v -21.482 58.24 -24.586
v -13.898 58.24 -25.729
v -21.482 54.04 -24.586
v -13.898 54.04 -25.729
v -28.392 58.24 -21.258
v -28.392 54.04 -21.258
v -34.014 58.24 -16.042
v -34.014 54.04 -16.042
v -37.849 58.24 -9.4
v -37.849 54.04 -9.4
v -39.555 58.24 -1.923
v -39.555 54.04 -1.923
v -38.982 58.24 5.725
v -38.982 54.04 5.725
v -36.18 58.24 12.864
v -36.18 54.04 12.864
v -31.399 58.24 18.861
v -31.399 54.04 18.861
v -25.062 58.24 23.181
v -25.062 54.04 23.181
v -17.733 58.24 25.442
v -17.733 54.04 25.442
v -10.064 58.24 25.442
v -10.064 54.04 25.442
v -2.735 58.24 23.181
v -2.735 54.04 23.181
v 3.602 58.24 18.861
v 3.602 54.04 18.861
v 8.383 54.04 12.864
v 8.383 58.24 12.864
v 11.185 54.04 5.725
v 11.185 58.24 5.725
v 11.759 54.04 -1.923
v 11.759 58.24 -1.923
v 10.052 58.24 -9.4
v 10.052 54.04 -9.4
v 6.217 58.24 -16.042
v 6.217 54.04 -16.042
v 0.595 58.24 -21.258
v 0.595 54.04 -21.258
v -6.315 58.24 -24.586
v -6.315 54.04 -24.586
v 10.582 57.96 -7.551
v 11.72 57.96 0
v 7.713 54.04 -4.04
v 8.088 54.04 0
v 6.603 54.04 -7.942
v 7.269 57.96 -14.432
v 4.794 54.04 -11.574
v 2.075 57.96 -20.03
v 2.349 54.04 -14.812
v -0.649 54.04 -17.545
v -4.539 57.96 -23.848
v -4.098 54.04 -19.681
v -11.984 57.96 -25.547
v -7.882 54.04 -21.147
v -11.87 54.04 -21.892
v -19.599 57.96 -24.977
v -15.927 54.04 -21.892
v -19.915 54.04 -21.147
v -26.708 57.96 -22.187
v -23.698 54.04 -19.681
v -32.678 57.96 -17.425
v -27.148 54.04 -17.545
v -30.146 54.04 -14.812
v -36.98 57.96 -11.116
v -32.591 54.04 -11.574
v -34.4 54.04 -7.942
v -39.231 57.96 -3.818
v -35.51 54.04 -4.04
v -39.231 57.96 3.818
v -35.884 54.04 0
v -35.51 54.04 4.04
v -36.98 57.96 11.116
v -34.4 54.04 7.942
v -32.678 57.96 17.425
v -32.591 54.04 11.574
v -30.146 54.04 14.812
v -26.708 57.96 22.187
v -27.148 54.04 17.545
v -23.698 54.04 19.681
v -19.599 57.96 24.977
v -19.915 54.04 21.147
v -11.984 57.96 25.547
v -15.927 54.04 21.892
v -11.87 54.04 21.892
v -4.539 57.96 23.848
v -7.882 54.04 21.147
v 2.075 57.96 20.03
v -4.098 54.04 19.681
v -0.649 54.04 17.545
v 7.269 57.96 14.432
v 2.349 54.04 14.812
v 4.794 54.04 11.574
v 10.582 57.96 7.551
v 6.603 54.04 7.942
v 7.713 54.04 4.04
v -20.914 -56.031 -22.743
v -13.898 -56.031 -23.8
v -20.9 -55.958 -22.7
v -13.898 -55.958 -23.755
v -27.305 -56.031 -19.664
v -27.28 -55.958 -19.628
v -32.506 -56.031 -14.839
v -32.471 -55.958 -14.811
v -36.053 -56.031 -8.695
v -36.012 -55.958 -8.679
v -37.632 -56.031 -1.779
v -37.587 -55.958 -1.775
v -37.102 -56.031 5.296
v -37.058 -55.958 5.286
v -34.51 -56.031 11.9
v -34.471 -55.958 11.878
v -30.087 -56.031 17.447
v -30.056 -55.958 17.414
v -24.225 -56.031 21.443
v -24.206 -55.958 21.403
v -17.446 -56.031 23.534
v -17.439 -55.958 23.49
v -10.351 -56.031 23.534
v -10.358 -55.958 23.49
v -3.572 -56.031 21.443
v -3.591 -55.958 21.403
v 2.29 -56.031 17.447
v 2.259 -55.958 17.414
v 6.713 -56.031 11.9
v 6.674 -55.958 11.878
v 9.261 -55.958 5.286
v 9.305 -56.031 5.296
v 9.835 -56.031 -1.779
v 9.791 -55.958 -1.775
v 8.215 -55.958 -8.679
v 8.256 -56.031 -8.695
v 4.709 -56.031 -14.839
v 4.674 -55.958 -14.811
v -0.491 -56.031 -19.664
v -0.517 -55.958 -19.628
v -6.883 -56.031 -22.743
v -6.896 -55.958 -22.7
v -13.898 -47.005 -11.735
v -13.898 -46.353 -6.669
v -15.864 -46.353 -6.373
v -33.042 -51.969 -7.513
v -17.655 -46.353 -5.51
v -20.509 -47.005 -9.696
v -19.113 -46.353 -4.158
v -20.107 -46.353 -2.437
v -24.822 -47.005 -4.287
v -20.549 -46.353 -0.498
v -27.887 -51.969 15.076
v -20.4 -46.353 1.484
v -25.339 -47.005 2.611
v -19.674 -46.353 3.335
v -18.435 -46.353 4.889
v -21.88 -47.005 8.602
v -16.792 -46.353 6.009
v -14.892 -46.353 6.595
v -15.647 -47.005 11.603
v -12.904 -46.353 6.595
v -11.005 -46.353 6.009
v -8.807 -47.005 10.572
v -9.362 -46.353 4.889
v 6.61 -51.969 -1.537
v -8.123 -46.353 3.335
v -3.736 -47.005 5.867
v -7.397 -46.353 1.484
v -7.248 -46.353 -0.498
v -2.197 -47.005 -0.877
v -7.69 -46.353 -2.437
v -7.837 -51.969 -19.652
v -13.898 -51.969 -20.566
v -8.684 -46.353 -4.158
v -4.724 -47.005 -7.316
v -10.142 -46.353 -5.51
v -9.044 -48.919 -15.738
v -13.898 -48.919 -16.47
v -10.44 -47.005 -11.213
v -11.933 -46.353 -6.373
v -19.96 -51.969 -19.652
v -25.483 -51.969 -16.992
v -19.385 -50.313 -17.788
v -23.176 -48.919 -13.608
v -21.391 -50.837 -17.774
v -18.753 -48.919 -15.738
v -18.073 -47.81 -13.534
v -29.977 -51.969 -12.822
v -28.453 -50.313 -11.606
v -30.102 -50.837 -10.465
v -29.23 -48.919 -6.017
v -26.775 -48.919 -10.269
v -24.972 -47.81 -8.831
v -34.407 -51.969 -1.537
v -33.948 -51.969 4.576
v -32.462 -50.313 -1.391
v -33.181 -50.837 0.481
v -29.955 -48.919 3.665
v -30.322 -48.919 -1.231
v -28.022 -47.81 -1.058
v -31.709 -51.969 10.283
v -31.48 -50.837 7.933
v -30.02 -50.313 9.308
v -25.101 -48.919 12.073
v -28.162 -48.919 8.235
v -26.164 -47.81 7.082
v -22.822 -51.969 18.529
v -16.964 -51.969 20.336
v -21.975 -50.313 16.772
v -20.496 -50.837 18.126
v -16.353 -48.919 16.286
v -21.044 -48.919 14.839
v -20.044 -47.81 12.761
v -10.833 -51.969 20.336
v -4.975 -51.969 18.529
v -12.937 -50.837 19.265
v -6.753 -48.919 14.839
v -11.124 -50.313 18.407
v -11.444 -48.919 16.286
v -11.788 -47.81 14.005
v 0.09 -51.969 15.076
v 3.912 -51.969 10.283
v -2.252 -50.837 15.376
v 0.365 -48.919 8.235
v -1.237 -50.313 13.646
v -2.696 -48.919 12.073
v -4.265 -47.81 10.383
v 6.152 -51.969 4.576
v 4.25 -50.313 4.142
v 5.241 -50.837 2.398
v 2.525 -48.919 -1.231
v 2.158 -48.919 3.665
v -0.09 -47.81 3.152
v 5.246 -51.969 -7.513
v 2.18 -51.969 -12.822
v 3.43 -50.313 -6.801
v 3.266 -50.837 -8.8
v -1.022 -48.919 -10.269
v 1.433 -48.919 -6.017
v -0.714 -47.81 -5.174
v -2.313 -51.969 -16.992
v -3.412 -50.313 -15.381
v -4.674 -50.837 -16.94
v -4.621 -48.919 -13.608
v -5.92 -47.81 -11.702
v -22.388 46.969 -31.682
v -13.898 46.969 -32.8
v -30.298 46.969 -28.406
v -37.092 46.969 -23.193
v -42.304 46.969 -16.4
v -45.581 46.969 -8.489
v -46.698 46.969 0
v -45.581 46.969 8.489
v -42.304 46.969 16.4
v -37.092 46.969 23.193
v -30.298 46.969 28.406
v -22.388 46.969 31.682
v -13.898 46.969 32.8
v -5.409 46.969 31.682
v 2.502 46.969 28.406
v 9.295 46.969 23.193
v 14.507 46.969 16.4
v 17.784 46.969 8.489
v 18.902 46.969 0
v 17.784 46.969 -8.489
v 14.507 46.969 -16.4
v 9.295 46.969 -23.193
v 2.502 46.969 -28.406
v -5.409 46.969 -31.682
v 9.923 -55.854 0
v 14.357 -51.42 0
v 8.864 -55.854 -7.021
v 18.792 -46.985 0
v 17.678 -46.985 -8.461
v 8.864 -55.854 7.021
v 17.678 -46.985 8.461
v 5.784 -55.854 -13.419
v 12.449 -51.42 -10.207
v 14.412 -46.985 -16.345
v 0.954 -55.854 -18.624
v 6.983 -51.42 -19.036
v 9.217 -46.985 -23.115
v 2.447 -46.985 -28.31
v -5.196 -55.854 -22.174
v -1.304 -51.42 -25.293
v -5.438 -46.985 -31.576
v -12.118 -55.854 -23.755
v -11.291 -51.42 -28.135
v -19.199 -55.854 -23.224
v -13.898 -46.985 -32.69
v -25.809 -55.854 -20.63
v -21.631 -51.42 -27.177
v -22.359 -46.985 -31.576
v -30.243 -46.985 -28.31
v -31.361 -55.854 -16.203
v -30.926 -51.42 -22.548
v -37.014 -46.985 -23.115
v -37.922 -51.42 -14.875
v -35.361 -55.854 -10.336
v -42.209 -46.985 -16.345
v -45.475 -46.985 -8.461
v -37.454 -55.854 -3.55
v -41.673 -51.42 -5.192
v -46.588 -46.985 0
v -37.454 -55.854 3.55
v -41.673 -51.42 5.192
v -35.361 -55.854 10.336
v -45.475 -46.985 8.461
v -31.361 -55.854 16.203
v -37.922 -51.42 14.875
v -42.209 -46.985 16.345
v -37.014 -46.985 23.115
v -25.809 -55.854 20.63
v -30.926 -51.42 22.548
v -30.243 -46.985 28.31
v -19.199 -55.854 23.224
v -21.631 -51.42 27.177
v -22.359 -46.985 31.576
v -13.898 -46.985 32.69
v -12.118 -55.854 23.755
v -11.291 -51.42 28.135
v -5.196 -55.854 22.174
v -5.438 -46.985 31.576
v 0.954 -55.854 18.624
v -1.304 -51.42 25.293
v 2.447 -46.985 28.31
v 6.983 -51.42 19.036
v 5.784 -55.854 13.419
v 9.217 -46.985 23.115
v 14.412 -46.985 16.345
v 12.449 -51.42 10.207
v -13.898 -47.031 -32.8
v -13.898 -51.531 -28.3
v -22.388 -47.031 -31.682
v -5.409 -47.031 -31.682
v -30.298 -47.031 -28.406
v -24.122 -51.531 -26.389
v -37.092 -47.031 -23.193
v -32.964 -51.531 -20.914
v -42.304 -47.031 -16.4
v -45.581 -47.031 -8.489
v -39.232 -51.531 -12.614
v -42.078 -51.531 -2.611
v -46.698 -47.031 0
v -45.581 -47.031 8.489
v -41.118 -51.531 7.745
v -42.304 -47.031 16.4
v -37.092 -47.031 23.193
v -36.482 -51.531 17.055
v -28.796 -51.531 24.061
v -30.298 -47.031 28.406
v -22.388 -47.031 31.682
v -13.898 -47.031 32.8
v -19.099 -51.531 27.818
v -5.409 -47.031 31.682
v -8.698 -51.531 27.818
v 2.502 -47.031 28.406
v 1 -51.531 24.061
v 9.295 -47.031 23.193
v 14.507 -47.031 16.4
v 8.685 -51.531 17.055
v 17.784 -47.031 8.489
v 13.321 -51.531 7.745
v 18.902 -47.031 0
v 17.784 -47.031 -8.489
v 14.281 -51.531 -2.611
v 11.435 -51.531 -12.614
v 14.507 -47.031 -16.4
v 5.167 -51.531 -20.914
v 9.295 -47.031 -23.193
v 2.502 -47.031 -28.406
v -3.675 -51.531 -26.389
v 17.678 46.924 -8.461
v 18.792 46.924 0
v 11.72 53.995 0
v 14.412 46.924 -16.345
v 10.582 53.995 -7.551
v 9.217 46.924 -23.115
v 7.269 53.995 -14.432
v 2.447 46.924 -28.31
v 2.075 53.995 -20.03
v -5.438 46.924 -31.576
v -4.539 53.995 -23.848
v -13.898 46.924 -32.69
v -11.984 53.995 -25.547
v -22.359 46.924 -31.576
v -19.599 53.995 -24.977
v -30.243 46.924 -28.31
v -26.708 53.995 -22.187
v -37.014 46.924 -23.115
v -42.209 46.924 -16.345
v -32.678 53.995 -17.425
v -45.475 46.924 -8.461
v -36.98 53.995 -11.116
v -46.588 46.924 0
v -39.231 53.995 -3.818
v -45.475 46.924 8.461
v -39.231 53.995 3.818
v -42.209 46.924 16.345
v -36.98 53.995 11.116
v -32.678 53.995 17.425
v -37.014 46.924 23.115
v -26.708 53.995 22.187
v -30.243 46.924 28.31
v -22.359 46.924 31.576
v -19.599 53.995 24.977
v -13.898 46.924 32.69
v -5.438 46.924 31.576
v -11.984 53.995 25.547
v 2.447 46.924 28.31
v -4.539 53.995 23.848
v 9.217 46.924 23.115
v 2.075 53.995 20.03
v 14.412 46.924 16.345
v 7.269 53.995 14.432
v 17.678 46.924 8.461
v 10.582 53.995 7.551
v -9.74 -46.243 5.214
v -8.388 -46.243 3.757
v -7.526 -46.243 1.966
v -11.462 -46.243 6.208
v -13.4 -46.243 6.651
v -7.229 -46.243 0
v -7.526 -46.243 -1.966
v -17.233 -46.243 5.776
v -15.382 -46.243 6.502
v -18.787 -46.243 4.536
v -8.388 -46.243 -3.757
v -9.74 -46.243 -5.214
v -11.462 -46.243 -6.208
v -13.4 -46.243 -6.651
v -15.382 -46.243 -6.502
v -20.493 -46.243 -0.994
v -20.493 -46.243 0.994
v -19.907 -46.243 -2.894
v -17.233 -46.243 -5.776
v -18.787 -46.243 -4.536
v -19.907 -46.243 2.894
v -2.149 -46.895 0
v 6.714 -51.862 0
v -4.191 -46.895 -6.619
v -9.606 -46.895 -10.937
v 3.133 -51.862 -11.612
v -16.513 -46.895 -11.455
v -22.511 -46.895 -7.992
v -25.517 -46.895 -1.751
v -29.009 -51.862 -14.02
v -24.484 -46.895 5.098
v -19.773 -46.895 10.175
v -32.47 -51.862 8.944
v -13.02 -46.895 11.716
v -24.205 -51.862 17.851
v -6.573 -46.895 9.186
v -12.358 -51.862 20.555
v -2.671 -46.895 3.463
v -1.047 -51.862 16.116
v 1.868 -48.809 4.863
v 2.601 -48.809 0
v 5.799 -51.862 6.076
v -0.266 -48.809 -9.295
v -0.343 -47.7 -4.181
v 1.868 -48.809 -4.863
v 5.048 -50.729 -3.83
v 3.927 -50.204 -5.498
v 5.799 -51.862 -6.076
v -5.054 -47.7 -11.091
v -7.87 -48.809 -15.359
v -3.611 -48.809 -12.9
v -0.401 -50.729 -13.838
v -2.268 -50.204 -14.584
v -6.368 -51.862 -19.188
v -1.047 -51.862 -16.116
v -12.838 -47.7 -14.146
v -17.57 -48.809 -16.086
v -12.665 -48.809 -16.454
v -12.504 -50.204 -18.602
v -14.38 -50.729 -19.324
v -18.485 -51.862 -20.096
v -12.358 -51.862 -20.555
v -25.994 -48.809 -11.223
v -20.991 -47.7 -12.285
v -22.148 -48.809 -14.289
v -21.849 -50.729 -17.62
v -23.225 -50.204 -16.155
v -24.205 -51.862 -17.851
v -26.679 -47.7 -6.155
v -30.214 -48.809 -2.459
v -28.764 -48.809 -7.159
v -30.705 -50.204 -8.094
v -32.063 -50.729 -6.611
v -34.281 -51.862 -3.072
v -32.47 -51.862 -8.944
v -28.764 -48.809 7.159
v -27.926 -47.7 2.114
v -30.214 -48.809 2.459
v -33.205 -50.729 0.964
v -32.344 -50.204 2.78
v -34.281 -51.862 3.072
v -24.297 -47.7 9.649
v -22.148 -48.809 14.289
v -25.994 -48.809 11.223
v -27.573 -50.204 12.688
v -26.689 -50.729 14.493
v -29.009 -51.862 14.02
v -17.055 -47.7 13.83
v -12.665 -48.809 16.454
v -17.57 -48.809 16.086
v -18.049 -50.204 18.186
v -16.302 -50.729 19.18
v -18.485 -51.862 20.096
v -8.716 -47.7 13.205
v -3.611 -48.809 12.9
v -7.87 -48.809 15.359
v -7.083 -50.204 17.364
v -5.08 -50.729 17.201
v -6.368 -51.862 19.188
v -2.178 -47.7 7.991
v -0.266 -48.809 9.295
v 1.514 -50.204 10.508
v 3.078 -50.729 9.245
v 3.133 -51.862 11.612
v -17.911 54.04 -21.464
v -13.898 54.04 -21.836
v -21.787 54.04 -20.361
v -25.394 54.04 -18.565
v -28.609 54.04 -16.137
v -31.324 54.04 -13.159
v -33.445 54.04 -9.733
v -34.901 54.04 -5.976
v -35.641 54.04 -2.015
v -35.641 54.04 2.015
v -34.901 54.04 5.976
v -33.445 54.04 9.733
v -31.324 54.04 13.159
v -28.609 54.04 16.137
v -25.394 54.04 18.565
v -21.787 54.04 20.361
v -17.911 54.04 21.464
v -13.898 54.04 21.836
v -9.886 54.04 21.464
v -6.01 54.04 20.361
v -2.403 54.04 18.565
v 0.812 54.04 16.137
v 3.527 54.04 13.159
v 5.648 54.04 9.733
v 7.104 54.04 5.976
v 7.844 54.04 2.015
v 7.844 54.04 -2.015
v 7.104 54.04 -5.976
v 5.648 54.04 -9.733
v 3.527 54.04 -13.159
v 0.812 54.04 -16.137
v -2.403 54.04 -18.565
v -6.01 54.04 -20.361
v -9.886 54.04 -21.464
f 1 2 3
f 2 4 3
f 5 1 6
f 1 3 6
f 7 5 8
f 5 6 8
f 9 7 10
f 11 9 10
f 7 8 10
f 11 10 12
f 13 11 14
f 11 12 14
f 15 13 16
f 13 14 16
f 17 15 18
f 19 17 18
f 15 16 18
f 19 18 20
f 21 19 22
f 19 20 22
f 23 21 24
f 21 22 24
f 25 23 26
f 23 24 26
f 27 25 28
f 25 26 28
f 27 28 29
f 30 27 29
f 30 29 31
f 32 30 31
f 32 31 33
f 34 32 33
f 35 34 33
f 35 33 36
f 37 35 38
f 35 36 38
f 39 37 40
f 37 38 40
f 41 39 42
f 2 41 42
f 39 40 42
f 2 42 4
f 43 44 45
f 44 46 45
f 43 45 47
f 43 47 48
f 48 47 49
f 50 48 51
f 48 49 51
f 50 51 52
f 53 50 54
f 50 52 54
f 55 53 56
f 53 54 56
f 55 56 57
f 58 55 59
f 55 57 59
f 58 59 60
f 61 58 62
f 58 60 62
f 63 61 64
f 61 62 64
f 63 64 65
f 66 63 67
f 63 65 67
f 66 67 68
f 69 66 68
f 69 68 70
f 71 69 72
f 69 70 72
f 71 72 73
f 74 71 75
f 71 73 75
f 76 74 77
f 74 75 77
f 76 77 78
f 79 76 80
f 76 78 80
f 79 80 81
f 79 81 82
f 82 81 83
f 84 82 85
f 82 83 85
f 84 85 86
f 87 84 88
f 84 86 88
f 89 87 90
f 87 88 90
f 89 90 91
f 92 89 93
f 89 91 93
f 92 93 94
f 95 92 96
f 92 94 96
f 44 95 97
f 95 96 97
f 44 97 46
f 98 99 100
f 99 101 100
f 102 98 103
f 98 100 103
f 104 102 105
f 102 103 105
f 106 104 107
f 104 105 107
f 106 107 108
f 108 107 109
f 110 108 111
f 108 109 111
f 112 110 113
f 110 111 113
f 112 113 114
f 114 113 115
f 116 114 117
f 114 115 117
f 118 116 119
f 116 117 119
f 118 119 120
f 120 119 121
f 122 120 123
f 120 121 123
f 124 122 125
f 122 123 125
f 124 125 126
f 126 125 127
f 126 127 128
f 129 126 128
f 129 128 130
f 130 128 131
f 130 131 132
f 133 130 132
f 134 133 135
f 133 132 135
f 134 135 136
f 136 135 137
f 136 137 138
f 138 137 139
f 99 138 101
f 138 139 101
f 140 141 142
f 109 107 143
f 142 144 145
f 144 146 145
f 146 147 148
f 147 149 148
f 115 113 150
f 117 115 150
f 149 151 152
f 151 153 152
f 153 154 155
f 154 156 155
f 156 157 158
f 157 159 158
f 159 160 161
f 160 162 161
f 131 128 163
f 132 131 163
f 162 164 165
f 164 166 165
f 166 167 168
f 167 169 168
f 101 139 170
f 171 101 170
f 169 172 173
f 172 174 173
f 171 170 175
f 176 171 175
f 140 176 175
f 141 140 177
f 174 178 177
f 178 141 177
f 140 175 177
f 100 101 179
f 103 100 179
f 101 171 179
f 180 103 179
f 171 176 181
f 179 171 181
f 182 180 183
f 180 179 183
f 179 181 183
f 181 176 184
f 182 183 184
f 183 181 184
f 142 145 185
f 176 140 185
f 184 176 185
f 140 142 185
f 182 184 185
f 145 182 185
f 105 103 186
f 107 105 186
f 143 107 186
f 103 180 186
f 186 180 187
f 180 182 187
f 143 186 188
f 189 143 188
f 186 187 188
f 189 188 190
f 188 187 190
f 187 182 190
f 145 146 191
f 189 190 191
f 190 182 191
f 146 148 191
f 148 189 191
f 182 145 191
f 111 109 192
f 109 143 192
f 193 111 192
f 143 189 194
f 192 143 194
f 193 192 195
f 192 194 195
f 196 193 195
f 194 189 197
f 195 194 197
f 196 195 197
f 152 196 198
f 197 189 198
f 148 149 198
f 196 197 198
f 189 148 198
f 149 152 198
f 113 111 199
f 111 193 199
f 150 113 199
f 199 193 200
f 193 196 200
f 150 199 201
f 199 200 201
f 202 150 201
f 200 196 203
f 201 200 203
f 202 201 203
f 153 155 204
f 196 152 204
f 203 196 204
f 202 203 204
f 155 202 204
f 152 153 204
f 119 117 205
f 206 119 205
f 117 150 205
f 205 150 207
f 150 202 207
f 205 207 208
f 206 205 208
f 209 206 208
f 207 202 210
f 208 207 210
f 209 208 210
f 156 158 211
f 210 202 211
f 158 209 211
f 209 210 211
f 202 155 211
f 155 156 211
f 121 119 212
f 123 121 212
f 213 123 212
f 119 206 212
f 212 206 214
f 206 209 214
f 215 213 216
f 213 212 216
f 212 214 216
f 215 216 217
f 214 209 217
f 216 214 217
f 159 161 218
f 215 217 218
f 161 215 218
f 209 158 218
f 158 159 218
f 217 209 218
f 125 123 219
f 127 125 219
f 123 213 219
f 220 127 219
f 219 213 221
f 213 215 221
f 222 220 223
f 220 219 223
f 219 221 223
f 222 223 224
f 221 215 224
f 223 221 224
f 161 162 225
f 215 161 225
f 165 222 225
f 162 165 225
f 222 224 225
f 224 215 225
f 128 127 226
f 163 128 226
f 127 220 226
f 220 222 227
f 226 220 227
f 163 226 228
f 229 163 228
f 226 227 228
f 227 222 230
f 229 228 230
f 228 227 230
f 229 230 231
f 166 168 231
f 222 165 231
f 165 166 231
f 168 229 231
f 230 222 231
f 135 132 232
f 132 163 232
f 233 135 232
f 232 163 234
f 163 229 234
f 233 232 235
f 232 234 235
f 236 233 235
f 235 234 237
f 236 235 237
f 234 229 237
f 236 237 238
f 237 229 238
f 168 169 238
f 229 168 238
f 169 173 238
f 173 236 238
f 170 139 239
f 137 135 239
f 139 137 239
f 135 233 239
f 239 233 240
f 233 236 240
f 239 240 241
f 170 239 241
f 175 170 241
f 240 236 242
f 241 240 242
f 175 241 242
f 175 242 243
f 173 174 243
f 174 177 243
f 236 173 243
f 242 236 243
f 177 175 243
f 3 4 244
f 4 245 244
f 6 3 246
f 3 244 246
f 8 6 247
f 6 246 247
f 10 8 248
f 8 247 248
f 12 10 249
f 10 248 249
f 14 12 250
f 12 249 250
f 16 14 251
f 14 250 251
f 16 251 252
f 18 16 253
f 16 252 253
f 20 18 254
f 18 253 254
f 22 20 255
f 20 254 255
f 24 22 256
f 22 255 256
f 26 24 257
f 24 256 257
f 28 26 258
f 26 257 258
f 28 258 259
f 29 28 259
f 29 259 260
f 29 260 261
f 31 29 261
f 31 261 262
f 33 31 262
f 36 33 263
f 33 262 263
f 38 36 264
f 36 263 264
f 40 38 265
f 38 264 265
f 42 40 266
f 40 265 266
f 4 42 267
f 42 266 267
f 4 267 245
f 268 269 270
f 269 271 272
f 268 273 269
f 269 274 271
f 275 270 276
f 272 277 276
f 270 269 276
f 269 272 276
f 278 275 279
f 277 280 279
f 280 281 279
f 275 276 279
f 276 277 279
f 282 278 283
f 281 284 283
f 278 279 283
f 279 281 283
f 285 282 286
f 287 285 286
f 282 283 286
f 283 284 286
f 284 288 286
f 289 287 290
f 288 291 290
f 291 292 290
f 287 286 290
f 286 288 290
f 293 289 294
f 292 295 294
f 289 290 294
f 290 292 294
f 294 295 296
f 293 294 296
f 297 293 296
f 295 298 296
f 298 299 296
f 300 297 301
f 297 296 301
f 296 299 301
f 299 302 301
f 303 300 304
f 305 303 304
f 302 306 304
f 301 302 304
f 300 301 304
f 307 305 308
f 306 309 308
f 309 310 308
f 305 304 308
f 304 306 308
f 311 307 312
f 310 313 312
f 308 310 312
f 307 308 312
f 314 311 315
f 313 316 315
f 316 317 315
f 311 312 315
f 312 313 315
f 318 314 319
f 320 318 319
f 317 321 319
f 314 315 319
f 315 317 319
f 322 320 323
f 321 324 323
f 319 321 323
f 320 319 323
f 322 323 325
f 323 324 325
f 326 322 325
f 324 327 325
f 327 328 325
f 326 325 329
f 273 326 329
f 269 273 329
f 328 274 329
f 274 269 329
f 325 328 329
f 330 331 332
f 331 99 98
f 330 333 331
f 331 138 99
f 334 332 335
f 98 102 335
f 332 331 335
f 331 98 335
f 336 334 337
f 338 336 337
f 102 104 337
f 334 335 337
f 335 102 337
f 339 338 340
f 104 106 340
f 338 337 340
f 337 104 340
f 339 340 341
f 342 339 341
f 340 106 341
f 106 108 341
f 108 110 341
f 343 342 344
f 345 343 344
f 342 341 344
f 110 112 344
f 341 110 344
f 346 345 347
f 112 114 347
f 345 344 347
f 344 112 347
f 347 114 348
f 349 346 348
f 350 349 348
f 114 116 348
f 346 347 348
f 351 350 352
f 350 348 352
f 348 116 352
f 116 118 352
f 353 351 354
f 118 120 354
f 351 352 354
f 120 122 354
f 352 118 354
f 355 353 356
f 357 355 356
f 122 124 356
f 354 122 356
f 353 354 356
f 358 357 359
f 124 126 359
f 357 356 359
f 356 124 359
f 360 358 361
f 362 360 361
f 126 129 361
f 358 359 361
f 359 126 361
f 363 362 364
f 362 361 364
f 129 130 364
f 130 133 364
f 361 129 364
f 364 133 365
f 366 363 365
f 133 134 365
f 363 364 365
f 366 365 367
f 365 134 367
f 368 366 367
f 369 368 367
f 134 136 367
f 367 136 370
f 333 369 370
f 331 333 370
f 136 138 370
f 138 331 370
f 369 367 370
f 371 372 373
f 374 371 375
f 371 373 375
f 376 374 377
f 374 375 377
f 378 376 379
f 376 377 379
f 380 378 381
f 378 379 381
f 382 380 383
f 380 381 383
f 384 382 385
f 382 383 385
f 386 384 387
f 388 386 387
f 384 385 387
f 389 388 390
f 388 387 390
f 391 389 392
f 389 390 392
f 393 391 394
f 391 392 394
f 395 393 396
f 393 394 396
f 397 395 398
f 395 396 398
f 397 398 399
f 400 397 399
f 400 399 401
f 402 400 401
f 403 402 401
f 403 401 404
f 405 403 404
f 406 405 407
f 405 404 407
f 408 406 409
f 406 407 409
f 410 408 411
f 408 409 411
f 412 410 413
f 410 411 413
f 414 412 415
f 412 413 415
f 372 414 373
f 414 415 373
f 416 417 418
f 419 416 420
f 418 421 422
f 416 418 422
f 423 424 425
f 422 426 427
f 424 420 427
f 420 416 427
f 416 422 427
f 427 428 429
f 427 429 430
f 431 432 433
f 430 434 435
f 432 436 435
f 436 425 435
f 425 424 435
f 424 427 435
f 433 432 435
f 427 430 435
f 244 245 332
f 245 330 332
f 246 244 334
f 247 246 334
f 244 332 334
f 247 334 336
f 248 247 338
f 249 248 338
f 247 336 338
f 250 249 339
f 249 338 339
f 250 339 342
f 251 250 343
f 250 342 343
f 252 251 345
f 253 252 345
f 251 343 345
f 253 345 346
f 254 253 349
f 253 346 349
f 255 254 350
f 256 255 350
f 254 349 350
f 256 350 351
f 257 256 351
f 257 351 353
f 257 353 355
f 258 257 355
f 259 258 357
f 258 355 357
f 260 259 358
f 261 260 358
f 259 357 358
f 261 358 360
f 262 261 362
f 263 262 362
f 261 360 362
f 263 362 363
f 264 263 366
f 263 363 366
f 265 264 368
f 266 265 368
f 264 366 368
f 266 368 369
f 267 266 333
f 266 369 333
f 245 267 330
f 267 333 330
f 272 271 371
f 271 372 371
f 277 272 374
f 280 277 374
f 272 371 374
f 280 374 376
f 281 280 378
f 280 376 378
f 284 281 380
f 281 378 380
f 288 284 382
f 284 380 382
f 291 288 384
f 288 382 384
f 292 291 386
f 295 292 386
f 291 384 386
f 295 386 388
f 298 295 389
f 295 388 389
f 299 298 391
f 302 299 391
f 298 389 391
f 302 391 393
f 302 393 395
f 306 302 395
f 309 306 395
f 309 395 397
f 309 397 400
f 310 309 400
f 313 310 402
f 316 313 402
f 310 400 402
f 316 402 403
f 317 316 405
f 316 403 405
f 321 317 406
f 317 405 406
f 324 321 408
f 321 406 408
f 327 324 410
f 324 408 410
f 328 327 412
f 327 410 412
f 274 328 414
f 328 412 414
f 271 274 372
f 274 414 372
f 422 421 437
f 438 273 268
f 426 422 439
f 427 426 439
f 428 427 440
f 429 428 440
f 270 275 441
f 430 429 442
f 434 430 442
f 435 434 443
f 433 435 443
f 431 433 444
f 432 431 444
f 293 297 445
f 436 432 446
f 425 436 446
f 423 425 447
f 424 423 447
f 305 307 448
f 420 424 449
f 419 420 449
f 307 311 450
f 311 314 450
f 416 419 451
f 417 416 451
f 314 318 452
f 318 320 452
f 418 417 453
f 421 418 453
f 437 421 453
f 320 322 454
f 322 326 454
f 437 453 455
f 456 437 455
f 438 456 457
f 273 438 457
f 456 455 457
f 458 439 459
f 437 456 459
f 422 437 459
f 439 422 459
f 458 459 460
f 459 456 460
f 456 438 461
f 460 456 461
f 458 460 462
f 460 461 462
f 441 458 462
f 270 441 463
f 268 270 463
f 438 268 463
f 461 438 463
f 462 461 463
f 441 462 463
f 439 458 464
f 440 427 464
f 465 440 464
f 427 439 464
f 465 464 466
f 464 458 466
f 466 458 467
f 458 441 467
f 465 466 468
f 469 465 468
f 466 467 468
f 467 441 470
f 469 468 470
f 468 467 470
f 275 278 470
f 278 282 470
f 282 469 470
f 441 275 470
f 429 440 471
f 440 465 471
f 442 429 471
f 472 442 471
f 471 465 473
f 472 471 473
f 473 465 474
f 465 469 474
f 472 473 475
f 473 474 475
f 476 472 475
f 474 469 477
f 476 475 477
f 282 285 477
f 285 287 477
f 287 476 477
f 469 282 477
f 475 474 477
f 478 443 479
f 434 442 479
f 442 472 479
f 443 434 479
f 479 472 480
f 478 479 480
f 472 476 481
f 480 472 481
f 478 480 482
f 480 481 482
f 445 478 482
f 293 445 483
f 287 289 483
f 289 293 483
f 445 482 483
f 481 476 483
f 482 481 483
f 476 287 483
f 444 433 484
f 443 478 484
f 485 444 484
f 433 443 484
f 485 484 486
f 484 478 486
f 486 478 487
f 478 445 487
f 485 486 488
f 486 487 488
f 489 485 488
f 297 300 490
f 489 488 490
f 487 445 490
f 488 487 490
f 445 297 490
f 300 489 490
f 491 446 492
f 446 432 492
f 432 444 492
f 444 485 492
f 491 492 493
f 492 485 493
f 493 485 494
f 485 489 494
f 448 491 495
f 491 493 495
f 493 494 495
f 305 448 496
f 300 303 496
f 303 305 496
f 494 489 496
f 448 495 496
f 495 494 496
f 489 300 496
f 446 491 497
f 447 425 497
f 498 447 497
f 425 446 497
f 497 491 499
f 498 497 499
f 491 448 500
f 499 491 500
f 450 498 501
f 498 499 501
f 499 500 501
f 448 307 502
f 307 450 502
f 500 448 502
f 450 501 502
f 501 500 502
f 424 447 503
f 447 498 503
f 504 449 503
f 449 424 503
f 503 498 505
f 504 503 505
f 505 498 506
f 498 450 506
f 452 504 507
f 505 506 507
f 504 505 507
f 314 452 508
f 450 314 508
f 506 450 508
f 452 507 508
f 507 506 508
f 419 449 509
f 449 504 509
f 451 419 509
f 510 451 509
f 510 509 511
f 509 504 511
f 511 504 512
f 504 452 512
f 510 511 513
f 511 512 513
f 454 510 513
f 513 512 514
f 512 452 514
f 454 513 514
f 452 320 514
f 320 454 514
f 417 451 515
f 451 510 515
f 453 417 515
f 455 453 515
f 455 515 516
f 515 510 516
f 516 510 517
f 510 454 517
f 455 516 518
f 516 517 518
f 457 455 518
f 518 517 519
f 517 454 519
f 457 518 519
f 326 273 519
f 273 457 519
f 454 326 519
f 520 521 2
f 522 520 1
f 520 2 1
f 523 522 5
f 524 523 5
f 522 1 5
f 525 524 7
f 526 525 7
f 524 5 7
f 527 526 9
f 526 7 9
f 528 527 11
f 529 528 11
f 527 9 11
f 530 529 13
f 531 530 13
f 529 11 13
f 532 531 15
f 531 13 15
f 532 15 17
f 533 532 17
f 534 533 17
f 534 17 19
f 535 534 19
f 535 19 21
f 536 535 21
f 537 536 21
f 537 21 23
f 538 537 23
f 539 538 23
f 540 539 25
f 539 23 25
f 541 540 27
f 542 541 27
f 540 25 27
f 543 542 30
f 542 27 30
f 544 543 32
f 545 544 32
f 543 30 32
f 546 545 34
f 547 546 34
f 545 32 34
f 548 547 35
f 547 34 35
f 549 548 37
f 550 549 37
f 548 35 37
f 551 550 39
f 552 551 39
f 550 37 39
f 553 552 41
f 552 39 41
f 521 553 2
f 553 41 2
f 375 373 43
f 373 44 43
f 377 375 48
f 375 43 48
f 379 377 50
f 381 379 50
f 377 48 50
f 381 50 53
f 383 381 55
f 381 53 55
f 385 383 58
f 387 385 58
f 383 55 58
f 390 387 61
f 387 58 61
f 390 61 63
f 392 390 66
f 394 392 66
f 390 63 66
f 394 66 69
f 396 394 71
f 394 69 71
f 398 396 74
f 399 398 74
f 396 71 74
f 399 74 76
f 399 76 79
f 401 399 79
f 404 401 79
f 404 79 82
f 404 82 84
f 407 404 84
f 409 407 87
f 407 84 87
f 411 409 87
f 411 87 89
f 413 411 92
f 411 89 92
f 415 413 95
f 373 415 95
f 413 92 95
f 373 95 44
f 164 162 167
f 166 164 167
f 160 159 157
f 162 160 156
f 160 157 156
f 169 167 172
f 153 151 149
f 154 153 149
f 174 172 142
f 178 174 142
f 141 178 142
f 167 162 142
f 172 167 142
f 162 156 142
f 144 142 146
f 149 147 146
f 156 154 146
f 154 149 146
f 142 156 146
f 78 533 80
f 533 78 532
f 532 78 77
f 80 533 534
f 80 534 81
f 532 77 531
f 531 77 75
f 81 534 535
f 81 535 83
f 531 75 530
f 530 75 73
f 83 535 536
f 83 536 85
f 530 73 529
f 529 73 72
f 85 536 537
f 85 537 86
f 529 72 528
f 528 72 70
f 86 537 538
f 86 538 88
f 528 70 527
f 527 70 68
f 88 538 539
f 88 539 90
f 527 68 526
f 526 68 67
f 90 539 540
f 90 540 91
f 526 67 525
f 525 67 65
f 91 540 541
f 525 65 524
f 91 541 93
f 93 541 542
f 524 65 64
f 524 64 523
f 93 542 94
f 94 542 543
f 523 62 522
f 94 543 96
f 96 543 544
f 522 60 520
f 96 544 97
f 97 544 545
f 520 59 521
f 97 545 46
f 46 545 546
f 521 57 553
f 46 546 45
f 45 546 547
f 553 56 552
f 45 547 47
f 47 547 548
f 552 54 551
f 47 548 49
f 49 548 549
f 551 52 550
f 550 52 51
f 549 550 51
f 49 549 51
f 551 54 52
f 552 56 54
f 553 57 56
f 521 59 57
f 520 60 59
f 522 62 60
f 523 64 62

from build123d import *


# Read off the part's stored shape, not the designer's step: Coque1
with BuildPart() as part:
    # Esquisse2 → Révolution1 (revolve)
    with BuildSketch(Plane.XY, mode=Mode.PRIVATE) as r_volution1_sk:
        with BuildLine():
            Line((-13.898458102, 54.040241613), (-35.734472287, 54.040241613))
            Line((-35.734472287, 54.040241613), (-39.62739029, 58.240241613))
            Line((-39.62739029, 58.240241613), (-39.62739029, 54.040241613))
            Line((-39.62739029, 54.040241613), (-46.698458102, 46.969173801))
            Line((-46.698458102, 46.969173801), (-46.698458102, -47.030826199))
            Line((-46.698458102, -47.030826199), (-37.698458102, -56.030826199))
            Line((-37.698458102, -56.030826199), (-37.653902917, -55.957591814))
            ThreePointArc((-37.653902917, -55.957591814), (-30.368059552, -48.918535602), (-20.567624939, -46.352739954))
            Line((-20.567624939, -46.352739954), (-13.898458102, -46.352739954))
            Line((-13.898458102, -46.352739954), (-13.898458102, 54.040241613))
        make_face()
    revolve(r_volution1_sk.sketch.rotate(Axis((-13.898458102, -46.352739954, 0), (0, 1, 0)), 270), axis=Axis((-13.898458102, -46.352739954, 0), (0, 1, 0)))

    # Coque1 outline → Coque1 (revolve, cut)
    with BuildSketch(Plane(origin=(-13.898458102, 0, 0), x_dir=(1, 0, 0), z_dir=(0, 0, 1))):
        with BuildLine():
            Line((21.985998539, 54.040241613), (0, 54.040241613))
            Line((0, 54.040241613), (0, -46.242739954))
            Line((0, -46.242739954), (6.669166837, -46.242739954))
            ThreePointArc((6.669166837, -46.242739954), (16.499847403, -48.809370278), (23.821157224, -55.854105483))
            Line((23.821157224, -55.854105483), (32.69, -46.985262707))
            Line((32.69, -46.985262707), (32.69, 46.92361031))
            Line((32.69, 46.92361031), (25.618932188, 53.994678121))
            Line((25.618932188, 53.994678121), (25.618932188, 57.959749117))
            Line((25.618932188, 57.959749117), (21.985998539, 54.040241613))
        make_face()
    revolve(axis=Axis((-13.898458102, 0, 0), (0, 1, 0)), mode=Mode.SUBTRACT)


solid = part.part
